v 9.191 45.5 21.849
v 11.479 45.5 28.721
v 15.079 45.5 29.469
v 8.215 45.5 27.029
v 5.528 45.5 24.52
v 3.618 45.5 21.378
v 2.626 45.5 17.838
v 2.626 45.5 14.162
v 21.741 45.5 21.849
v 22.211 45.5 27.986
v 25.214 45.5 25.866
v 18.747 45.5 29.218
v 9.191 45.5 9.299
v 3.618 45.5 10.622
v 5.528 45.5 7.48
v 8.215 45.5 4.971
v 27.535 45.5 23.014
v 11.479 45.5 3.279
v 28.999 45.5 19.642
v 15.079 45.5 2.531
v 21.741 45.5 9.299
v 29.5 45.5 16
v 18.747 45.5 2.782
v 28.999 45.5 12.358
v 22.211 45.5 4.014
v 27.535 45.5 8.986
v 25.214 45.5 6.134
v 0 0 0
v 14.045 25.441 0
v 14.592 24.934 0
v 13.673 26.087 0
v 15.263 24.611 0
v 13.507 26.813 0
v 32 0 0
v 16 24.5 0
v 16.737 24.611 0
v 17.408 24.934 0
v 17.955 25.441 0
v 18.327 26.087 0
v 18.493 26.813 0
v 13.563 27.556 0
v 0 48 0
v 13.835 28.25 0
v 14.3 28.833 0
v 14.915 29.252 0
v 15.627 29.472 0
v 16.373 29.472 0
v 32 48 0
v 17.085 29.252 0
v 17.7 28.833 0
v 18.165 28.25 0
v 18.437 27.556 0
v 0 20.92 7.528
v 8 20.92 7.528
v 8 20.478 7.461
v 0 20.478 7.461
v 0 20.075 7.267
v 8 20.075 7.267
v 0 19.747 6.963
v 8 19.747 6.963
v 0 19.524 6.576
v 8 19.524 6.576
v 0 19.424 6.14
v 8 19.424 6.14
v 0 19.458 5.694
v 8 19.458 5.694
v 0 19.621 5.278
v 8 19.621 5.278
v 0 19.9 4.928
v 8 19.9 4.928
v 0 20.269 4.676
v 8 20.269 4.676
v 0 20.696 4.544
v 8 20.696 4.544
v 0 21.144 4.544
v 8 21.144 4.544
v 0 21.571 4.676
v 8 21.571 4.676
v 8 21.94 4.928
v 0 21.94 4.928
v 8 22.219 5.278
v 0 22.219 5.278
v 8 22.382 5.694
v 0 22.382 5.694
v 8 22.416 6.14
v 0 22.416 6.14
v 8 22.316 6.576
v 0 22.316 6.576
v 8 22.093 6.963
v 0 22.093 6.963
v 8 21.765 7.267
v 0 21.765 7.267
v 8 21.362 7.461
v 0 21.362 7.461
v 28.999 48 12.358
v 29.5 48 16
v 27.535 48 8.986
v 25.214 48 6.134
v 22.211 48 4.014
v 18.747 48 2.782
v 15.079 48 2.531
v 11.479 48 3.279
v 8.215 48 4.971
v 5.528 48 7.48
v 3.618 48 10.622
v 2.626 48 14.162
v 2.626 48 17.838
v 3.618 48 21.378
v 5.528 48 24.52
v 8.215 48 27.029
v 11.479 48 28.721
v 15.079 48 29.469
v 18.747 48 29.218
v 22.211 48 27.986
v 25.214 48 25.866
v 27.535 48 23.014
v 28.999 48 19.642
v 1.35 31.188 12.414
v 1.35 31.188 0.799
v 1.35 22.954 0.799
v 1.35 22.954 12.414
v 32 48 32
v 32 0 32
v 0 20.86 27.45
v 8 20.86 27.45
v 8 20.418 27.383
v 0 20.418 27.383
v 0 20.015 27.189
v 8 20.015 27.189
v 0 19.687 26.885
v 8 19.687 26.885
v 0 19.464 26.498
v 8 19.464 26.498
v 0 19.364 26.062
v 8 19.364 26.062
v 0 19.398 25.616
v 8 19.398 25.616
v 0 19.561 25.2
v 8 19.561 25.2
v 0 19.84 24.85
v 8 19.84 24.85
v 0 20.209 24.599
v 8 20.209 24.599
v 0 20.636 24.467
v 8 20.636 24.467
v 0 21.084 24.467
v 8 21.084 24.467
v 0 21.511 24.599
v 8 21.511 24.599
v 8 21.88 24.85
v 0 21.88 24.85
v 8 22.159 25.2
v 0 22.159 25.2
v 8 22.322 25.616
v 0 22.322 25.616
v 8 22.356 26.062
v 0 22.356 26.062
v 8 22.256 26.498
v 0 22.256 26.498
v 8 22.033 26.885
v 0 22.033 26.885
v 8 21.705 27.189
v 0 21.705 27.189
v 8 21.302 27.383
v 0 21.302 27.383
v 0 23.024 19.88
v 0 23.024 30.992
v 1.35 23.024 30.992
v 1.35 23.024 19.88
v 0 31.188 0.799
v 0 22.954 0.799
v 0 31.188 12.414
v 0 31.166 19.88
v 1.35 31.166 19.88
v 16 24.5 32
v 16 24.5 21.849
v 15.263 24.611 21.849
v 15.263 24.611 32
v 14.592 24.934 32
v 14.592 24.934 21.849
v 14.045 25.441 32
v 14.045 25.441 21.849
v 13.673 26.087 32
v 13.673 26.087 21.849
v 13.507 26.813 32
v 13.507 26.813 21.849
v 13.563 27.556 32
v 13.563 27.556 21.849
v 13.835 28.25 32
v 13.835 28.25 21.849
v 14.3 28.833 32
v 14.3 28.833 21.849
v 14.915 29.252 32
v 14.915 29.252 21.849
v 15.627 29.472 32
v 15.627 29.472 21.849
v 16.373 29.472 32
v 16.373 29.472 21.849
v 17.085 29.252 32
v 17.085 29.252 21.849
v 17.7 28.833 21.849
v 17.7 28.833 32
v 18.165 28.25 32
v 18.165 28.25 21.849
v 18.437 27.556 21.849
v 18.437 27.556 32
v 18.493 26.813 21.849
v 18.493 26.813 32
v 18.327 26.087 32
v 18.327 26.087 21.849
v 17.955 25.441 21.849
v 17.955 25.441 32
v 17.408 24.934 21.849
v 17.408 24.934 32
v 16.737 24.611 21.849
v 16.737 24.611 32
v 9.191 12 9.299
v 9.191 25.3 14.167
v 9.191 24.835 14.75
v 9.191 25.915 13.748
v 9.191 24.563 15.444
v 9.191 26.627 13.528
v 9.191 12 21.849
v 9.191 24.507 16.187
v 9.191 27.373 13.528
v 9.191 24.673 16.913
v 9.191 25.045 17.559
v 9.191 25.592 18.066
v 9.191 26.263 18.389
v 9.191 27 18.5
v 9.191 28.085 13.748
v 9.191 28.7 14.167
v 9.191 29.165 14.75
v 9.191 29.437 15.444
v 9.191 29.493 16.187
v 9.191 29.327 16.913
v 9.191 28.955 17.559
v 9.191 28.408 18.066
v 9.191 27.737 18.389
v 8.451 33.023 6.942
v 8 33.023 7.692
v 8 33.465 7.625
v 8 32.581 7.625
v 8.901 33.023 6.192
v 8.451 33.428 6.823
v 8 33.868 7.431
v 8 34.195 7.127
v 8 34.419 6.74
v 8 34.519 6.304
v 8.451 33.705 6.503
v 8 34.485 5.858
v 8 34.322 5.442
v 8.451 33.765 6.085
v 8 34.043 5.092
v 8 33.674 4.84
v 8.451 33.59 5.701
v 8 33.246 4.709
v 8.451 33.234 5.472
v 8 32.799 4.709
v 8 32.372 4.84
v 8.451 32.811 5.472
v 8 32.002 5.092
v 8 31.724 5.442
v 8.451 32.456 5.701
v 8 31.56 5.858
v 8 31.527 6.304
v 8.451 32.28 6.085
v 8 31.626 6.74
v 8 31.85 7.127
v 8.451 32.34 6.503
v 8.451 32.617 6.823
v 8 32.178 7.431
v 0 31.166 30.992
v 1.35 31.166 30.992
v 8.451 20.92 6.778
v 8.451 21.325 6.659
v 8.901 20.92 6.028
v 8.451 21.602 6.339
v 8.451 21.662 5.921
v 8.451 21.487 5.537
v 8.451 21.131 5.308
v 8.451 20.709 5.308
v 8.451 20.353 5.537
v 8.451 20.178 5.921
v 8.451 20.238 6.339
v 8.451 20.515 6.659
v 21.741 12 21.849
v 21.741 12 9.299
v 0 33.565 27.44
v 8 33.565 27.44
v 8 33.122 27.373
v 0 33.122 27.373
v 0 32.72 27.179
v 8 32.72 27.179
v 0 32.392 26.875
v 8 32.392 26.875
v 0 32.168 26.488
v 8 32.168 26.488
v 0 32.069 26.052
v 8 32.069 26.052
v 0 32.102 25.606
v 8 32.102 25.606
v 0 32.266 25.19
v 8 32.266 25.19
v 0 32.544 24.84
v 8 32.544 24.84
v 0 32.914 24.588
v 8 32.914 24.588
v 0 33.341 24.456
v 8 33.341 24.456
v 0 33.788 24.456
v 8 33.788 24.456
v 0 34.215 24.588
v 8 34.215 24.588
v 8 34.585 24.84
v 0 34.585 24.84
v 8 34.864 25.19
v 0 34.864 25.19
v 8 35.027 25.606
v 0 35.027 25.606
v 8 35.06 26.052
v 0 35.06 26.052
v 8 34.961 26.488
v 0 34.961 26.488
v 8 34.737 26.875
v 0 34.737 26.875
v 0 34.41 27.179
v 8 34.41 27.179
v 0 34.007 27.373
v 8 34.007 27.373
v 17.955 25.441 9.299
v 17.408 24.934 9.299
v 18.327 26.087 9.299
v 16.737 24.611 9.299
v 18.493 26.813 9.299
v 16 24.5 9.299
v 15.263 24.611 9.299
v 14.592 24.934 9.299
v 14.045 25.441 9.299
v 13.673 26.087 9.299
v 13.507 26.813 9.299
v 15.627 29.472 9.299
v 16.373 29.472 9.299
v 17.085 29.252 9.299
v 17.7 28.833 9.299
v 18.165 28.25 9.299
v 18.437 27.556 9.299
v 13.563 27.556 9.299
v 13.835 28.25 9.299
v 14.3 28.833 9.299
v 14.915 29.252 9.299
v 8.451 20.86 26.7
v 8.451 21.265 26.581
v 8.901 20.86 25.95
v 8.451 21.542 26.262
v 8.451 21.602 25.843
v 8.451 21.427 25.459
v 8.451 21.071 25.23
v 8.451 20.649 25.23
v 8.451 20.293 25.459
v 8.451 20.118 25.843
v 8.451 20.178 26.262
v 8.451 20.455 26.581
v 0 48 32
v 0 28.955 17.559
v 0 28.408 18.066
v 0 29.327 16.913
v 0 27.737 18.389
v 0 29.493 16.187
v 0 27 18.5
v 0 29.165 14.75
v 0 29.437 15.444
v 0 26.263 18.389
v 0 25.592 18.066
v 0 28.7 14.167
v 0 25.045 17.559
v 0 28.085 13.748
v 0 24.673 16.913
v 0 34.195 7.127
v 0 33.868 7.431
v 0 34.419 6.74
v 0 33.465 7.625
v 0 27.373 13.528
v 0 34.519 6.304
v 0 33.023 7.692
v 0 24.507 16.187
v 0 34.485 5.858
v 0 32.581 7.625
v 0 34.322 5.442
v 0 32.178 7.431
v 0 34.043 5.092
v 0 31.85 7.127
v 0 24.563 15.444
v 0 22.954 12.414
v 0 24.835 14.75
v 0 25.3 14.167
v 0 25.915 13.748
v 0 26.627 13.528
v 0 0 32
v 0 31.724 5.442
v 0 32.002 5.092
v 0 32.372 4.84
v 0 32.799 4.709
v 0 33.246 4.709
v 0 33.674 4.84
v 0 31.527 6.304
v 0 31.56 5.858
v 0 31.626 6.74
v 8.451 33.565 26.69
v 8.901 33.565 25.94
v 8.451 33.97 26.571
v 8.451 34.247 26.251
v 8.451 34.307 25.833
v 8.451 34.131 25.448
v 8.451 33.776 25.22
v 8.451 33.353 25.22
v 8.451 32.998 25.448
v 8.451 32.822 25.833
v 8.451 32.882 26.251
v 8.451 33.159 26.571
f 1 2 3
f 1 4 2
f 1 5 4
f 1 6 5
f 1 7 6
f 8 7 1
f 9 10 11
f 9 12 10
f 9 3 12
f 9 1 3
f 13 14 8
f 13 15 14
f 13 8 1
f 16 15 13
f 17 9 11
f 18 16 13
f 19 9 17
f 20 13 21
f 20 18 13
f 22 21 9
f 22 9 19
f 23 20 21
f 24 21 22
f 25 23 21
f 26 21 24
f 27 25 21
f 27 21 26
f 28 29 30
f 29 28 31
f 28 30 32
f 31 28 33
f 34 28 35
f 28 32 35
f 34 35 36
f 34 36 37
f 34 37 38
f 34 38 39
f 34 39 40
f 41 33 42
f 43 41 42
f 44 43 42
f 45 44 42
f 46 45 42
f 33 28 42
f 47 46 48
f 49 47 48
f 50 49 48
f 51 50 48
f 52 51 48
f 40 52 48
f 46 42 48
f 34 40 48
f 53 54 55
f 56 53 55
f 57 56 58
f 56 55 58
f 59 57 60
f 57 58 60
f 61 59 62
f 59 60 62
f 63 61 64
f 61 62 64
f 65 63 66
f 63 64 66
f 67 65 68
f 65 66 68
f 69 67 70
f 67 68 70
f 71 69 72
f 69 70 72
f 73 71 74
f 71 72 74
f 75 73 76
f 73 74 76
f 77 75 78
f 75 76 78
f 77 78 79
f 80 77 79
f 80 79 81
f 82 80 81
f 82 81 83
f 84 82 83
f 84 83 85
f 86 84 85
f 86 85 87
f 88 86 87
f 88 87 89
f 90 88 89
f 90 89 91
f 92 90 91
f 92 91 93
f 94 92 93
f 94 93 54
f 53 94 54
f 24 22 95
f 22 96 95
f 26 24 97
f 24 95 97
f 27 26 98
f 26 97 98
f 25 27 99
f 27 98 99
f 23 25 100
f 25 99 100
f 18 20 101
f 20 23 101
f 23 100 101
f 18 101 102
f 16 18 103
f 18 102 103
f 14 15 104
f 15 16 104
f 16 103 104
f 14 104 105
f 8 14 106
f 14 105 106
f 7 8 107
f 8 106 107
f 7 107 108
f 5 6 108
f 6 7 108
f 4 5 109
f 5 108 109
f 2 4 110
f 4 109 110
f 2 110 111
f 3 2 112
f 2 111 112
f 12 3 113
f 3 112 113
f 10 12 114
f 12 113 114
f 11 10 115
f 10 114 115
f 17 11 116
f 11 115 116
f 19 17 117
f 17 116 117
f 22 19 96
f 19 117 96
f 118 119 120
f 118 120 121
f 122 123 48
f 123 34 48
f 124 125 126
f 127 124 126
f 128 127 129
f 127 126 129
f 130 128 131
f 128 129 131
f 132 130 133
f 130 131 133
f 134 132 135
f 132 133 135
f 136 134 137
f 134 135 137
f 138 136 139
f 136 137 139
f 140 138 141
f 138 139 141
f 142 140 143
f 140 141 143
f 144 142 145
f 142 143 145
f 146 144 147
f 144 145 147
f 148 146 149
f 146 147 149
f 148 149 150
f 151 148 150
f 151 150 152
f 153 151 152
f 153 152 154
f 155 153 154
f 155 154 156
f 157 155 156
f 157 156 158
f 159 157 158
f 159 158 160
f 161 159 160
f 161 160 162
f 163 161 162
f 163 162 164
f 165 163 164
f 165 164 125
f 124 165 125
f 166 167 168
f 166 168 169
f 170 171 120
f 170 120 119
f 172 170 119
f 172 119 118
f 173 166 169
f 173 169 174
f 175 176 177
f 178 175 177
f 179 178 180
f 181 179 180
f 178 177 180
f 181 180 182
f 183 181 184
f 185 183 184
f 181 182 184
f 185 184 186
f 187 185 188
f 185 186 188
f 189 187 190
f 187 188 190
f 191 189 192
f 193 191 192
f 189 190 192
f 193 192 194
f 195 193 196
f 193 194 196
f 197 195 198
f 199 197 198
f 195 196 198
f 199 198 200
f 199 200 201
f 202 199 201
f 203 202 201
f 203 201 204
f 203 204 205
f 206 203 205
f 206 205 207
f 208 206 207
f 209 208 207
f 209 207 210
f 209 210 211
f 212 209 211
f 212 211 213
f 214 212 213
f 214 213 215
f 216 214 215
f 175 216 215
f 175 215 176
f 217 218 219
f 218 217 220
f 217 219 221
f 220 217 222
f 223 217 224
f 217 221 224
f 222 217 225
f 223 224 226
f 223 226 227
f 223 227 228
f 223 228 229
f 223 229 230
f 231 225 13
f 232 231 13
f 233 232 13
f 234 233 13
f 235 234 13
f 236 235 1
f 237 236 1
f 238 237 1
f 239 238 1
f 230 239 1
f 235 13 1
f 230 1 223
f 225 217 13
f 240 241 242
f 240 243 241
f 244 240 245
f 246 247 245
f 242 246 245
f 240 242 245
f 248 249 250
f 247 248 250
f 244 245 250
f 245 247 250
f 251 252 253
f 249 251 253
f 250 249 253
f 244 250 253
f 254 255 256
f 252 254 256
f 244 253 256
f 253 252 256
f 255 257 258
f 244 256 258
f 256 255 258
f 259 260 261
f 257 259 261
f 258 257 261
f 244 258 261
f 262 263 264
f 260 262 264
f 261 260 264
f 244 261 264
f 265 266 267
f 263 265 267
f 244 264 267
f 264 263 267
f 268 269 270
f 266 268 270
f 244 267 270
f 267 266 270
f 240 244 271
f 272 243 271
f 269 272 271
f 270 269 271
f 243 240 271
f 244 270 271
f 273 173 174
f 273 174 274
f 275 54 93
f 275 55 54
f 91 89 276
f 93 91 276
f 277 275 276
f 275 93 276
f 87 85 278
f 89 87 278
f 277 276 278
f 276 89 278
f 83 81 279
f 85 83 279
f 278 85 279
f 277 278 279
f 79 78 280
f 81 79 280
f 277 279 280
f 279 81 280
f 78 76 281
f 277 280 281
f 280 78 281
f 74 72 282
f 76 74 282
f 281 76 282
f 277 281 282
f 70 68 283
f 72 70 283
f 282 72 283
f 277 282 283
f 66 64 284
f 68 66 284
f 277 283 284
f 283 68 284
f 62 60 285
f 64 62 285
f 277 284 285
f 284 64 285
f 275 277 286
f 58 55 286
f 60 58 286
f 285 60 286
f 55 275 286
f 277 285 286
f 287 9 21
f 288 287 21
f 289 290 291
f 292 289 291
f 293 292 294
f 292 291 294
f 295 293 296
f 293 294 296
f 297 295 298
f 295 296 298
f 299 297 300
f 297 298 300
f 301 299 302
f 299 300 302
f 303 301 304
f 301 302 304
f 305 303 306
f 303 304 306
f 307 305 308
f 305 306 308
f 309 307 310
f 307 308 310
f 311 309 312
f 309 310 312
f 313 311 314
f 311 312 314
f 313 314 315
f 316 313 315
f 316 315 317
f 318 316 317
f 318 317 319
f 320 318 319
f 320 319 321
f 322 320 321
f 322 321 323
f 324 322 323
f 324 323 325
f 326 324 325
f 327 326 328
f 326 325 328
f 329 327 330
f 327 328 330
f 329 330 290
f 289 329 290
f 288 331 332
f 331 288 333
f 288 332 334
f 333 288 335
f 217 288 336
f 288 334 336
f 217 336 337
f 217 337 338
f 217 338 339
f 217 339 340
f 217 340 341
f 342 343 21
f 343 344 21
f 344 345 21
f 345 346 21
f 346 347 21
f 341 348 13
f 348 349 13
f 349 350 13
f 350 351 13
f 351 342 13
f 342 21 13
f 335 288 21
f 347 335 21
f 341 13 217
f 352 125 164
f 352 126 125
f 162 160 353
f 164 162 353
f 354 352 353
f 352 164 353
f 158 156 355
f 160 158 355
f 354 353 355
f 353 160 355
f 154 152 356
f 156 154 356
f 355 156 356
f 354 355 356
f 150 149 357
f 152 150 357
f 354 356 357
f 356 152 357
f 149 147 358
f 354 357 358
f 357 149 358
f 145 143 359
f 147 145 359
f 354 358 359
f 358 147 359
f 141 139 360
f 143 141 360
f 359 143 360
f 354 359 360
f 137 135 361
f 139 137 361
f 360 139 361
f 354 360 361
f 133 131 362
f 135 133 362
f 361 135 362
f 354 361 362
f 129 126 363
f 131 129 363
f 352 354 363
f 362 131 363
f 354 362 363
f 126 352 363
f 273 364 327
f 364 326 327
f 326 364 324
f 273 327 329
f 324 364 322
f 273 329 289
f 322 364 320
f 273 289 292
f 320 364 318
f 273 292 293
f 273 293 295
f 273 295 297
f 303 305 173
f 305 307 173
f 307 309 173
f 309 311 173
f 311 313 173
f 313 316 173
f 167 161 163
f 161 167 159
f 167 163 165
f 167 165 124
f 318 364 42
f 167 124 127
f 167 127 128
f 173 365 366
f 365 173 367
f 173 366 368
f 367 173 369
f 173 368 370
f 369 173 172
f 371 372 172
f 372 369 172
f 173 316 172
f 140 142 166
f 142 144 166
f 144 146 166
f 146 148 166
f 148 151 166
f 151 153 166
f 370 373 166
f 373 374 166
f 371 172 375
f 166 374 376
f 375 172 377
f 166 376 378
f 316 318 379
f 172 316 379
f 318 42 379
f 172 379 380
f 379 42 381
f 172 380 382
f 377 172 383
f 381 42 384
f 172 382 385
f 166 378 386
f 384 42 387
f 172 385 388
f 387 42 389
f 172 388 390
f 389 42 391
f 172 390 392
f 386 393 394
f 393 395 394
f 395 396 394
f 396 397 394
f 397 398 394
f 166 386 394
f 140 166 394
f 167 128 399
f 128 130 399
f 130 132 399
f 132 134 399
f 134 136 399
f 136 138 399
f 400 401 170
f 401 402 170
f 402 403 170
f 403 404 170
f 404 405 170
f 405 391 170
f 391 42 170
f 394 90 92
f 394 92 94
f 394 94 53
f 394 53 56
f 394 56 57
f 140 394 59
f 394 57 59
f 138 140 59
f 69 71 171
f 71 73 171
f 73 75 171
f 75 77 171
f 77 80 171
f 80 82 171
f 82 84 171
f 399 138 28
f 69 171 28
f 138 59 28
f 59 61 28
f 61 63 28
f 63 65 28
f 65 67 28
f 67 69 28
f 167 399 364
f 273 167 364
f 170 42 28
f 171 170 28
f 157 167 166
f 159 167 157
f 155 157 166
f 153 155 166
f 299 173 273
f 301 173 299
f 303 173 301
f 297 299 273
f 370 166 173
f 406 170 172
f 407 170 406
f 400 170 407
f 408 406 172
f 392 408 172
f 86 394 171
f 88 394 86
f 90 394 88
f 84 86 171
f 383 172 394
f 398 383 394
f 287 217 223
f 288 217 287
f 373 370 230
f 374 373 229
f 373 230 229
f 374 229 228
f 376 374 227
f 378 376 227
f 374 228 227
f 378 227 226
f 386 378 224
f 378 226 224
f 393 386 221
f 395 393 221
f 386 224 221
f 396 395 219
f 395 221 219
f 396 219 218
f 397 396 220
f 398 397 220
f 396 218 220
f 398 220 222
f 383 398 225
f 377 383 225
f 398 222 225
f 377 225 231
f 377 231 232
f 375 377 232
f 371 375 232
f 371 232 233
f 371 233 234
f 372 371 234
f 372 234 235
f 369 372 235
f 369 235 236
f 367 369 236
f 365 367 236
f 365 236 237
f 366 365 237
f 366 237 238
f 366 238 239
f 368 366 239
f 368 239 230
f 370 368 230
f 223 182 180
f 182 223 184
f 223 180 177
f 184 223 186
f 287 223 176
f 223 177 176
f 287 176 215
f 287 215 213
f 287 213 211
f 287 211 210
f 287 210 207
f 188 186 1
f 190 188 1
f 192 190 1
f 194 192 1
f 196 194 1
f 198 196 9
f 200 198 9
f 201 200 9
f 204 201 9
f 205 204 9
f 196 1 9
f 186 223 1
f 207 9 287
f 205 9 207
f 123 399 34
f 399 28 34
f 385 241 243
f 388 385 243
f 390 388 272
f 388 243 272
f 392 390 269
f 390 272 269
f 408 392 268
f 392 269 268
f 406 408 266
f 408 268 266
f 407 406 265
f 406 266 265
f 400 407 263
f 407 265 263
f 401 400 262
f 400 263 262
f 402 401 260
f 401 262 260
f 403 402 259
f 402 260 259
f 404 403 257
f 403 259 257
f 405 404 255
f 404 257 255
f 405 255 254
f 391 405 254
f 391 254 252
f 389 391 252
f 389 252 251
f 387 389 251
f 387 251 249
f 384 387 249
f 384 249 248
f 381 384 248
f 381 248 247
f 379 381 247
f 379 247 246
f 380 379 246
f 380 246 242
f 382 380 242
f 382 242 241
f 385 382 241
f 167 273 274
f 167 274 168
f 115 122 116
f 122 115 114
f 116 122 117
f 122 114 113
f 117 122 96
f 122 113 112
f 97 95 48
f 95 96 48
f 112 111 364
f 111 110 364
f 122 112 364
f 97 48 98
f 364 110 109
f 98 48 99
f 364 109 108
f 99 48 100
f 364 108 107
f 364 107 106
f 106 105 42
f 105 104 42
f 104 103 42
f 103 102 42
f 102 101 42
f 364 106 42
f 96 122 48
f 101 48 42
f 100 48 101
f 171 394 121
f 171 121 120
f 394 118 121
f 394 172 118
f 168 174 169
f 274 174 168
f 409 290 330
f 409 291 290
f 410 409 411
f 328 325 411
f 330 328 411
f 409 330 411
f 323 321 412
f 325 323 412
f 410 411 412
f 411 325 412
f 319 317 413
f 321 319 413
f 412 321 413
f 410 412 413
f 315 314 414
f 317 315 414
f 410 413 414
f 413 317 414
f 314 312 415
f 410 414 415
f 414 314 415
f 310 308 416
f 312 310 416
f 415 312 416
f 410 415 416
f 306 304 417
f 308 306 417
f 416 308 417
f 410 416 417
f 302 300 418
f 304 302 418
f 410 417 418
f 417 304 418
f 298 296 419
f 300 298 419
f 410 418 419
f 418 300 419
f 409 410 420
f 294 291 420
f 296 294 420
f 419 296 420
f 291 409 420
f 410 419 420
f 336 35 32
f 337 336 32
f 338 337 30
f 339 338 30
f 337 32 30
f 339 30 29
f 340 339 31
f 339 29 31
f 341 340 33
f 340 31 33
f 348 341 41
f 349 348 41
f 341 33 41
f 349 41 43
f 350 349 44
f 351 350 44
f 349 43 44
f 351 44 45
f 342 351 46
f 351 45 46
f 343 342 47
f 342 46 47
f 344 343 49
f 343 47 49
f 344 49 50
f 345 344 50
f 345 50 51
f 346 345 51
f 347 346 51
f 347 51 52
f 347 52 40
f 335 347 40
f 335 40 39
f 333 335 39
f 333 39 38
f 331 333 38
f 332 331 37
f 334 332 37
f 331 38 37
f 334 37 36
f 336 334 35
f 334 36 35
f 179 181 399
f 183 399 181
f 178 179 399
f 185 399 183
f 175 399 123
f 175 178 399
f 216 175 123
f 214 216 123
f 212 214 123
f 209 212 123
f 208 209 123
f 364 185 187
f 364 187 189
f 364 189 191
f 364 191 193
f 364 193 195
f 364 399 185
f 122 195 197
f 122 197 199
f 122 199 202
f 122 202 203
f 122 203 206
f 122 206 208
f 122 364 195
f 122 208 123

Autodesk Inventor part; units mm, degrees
ref_plane "YZ Plane" through (0, 0, 0) normal (1, 0, 0) x (0, 1, 0)
ref_plane "XZ Plane" through (0, 0, 0) normal (0, 1, 0) x (-1, 0, 0)
ref_plane "XY Plane" through (0, 0, 0) normal (0, 0, 1) x (1, 0, 0)
sketch "Sketch3" plane through (0, 0, 0) normal (0, 0, 1) x (1, 0, 0)
  line L0 (0, 0) -> (32, 0)
  line L1 (32, 0) -> (32, 48)
  line L2 (32, 48) -> (0, 48)
  line L3 (0, 48) -> (0, 0)
  dimension "d8" = 32
  dimension "d9" = 48
extrude "Extrusion2" add sketch "Sketch3" along normal blind 32
sketch "Sketch4" plane through (0, 48, 0) normal (0, 1, 0) x (1, 0, 0)
  line L0 (32, -32) -> (0, -32) projected
  line L1 (0, -32) -> (0, -16)
  line L2 (0, 0) -> (0, -32) projected
  line L3 (0, -16) -> (16, -16)
  circle A0 centre (16, -16) radius 13.5
  dimension "d12" = 16
  dimension "d13" = 16
  dimension "d14" = 27
sketch "Sketch5" plane through (0, 48, 0) normal (0, 1, 0) x (1, 0, 0)
  line L0 (15.9518, -16.0315) -> (15.9518, -9.2765)
  line L1 (15.9518, -9.2765) -> (9.1968, -9.2765)
  point P0 (0, 0)
  dimension "d15" = 6.755
  dimension "d16" = 6.755
sketch "Sketch6" plane through (0, 48, 0) normal (0, 1, 0) x (1, 0, 0)
  line L0 (9.1912, -9.2989) -> (9.1912, -21.8489)
  line L1 (9.1912, -21.8489) -> (21.7412, -21.8489)
  line L2 (21.7412, -21.8489) -> (21.7412, -9.2989)
  line L3 (21.7412, -9.2989) -> (9.1912, -9.2989)
  point P0 (0, 0)
  dimension "d17" = 12.55
  dimension "d18" = 12.55
  dimension "d19" = 12.55
  dimension "d20" = 12.55
extrude "Extrusion4" cut sketch "Sketch6" against normal blind 36
sketch "Sketch7" plane through (0, 0, 32) normal (0, 0, 1) x (1, 0, 0)
  line L0 (32, 48) -> (0, 48) projected
  line L1 (0, 48) -> (16, 48)
  line L2 (16, 48) -> (16, 27)
  circle A0 centre (16, 27) radius 2.5
  point P0 (0, 0)
  dimension "d25" = 16
  dimension "d26" = 21
  dimension "d27" = 5
hole "Hole1" at (16, 27, 32) direction (0, 0, -1) diameter 5 end through all
sketch "Sketch9" plane through (0, 0, 0) normal (-1, 0, 0) x (0, 0, 1)
  line L0 (0, 48) -> (16, 48)
  line L1 (21.8489, 48) -> (9.2989, 48) projected
  line L2 (16, 48) -> (16, 27)
  circle A0 centre (16, 27) radius 2.5
  point P0 (0, 0)
  dimension "d37" = 16
  dimension "d38" = 21
  dimension "d39" = 5
hole "Hole2" at (0, 27, 16) direction (1, 0, 0) diameter 5 depth 10 tip angle 118
sketch "Sketch10" plane through (21.7412, 48, 9.2989) normal (-1, 0, 0) x (0, 0, 1)
  circle A0 centre (6.7011, -21) radius 2.5 projected
  line L0 (6.7011, -21) -> (6.7011, -9.86)
  line L1 (6.7011, -9.86) -> (6.7011, -21)
  line L2 (6.7011, -21) -> (6.7011, -9.86)
  line L3 (6.7011, -21) -> (6.7011, -32.14)
  line L4 (12.55, -36) -> (0, -36) projected
  line L5 (6.7011, -32.14) -> (6.7011, -21)
  line L6 (6.7011, -9.86) -> (21.6511, -9.86)
  line L7 (22.7011, -48) -> (22.7011, 0) projected
  line L8 (21.6511, -9.86) -> (6.7011, -9.86)
  line L9 (6.7011, -9.86) -> (-8.2489, -9.86)
  line L10 (21.6511, -9.86) -> (19.0973, -9.86)
  point P0 (-9.2989, -48)
  dimension "d47" = 11.14
  dimension "d48" = 11.14
  dimension "d49" = 14.95
  dimension "d50" = 14.95
sketch "Sketch11" plane through (0, 0, 0) normal (-1, 0, 0) x (0, 0, 1)
  line L0 (16.1419, 38.0227) -> (31.0919, 38.0227)
  line L1 (31.0919, 38.0227) -> (31.0919, 15.7427)
  line L2 (31.0919, 15.7427) -> (1.1919, 15.7427)
  line L3 (1.1919, 15.7427) -> (1.1919, 38.0227)
  line L4 (1.1919, 38.0227) -> (16.1419, 38.0227)
  line L5 (1.1919, 38.0227) -> (6.1919, 38.0227)
  line L6 (6.1919, 38.0227) -> (6.1919, 33.0227)
  circle A0 centre (6.1919, 33.0227) radius 1.7416
  point P0 (0, 0)
  dimension "d51" = 14.95
  dimension "d52" = 22.28
  dimension "d53" = 29.9
  dimension "d54" = 5
  dimension "d55" = 5
hole "Hole3" at (0, 33.0227, 6.1919) direction (1, 0, 0) diameter 3 depth 8 tip angle 118
sketch "Sketch12" plane through (0, 0, 0) normal (-1, 0, 0) x (0, 0, 1)
  point P0 (0, 0)
sketch "Sketch13" plane through (0, 0, 0) normal (-1, 0, 0) x (0, 0, 1)
  line L0 (30.9396, 38.5646) -> (25.9396, 38.5646)
  line L1 (25.9396, 38.5646) -> (25.9396, 33.5646)
  circle A0 centre (25.9396, 33.5646) radius 1.5
  point P0 (0, 0)
  dimension "d63" = 5
  dimension "d64" = 5
  dimension "d65" = 3
hole "Hole4" at (0, 33.5646, 25.9396) direction (1, 0, 0) diameter 3 depth 8 tip angle 118
sketch "Sketch14" plane through (0, 0, 0) normal (-1, 0, 0) x (0, 0, 1)
  line L0 (15.9777, 27.06) -> (1.0277, 27.06)
  line L1 (1.0277, 27.06) -> (1.0277, 15.92)
  line L2 (1.0277, 15.92) -> (6.0277, 15.92)
  line L3 (6.0277, 15.92) -> (6.0277, 20.92)
  circle A0 centre (6.0277, 20.92) radius 1.5
  point P0 (0, 0)
  dimension "d73" = 14.95
  dimension "d74" = 11.14
  dimension "d75" = 5
  dimension "d76" = 5
  dimension "d77" = 3
hole "Hole5" at (0, 20.92, 6.0277) direction (1, 0, 0) diameter 3 depth 8 tip angle 118
sketch "Sketch15" plane through (0, 0, 0) normal (-1, 0, 0) x (0, 0, 1)
  circle A0 centre (16, 27) radius 2.5 projected
  line L0 (16, 27) -> (30.95, 27)
  line L1 (30.95, 27) -> (30.95, 15.86)
  line L2 (30.95, 15.86) -> (25.95, 15.86)
  line L3 (25.95, 15.86) -> (25.95, 20.86)
  circle A1 centre (25.95, 20.86) radius 1.5
  point P0 (0, 0)
  dimension "d85" = 14.95
  dimension "d86" = 11.14
  dimension "d87" = 5
  dimension "d88" = 5
  dimension "d89" = 3
hole "Hole6" at (0, 20.86, 25.95) direction (1, 0, 0) diameter 3 depth 8 tip angle 118
sketch "Sketch16" plane through (0, 0, 0) normal (-1, 0, 0) x (0, 0, 1)
  line L0 (0, 48) -> (0, 0) projected
  line L1 (0.7991, 31.1876) -> (12.4138, 31.1876)
  line L2 (9.2989, 48) -> (9.2989, 12) projected
  line L3 (12.4138, 31.1876) -> (12.4138, 22.9537)
  line L4 (12.4138, 22.9537) -> (0.7991, 22.9537)
  line L5 (0.7991, 22.9537) -> (0.7991, 31.1876)
extrude "Extrusion5" cut sketch "Sketch16" against normal blind 1.35
sketch "Sketch17" plane through (0, 0, 0) normal (-1, 0, 0) x (0, 0, 1)
  line L0 (19.8801, 31.1662) -> (30.9916, 31.1662)
  line L1 (30.9916, 31.1662) -> (30.9916, 23.0241)
  line L2 (30.9916, 23.0241) -> (19.8801, 23.0241)
  line L3 (19.8801, 23.0241) -> (19.8801, 31.1662)
  point P0 (0, 0)
extrude "Extrusion6" cut sketch "Sketch17" against normal blind 1.35
extrude "Extrusion7" cut sketch "Sketch4" against normal blind 2.5
properties part number "alan_optics_through_hole_chl_turbidity"
